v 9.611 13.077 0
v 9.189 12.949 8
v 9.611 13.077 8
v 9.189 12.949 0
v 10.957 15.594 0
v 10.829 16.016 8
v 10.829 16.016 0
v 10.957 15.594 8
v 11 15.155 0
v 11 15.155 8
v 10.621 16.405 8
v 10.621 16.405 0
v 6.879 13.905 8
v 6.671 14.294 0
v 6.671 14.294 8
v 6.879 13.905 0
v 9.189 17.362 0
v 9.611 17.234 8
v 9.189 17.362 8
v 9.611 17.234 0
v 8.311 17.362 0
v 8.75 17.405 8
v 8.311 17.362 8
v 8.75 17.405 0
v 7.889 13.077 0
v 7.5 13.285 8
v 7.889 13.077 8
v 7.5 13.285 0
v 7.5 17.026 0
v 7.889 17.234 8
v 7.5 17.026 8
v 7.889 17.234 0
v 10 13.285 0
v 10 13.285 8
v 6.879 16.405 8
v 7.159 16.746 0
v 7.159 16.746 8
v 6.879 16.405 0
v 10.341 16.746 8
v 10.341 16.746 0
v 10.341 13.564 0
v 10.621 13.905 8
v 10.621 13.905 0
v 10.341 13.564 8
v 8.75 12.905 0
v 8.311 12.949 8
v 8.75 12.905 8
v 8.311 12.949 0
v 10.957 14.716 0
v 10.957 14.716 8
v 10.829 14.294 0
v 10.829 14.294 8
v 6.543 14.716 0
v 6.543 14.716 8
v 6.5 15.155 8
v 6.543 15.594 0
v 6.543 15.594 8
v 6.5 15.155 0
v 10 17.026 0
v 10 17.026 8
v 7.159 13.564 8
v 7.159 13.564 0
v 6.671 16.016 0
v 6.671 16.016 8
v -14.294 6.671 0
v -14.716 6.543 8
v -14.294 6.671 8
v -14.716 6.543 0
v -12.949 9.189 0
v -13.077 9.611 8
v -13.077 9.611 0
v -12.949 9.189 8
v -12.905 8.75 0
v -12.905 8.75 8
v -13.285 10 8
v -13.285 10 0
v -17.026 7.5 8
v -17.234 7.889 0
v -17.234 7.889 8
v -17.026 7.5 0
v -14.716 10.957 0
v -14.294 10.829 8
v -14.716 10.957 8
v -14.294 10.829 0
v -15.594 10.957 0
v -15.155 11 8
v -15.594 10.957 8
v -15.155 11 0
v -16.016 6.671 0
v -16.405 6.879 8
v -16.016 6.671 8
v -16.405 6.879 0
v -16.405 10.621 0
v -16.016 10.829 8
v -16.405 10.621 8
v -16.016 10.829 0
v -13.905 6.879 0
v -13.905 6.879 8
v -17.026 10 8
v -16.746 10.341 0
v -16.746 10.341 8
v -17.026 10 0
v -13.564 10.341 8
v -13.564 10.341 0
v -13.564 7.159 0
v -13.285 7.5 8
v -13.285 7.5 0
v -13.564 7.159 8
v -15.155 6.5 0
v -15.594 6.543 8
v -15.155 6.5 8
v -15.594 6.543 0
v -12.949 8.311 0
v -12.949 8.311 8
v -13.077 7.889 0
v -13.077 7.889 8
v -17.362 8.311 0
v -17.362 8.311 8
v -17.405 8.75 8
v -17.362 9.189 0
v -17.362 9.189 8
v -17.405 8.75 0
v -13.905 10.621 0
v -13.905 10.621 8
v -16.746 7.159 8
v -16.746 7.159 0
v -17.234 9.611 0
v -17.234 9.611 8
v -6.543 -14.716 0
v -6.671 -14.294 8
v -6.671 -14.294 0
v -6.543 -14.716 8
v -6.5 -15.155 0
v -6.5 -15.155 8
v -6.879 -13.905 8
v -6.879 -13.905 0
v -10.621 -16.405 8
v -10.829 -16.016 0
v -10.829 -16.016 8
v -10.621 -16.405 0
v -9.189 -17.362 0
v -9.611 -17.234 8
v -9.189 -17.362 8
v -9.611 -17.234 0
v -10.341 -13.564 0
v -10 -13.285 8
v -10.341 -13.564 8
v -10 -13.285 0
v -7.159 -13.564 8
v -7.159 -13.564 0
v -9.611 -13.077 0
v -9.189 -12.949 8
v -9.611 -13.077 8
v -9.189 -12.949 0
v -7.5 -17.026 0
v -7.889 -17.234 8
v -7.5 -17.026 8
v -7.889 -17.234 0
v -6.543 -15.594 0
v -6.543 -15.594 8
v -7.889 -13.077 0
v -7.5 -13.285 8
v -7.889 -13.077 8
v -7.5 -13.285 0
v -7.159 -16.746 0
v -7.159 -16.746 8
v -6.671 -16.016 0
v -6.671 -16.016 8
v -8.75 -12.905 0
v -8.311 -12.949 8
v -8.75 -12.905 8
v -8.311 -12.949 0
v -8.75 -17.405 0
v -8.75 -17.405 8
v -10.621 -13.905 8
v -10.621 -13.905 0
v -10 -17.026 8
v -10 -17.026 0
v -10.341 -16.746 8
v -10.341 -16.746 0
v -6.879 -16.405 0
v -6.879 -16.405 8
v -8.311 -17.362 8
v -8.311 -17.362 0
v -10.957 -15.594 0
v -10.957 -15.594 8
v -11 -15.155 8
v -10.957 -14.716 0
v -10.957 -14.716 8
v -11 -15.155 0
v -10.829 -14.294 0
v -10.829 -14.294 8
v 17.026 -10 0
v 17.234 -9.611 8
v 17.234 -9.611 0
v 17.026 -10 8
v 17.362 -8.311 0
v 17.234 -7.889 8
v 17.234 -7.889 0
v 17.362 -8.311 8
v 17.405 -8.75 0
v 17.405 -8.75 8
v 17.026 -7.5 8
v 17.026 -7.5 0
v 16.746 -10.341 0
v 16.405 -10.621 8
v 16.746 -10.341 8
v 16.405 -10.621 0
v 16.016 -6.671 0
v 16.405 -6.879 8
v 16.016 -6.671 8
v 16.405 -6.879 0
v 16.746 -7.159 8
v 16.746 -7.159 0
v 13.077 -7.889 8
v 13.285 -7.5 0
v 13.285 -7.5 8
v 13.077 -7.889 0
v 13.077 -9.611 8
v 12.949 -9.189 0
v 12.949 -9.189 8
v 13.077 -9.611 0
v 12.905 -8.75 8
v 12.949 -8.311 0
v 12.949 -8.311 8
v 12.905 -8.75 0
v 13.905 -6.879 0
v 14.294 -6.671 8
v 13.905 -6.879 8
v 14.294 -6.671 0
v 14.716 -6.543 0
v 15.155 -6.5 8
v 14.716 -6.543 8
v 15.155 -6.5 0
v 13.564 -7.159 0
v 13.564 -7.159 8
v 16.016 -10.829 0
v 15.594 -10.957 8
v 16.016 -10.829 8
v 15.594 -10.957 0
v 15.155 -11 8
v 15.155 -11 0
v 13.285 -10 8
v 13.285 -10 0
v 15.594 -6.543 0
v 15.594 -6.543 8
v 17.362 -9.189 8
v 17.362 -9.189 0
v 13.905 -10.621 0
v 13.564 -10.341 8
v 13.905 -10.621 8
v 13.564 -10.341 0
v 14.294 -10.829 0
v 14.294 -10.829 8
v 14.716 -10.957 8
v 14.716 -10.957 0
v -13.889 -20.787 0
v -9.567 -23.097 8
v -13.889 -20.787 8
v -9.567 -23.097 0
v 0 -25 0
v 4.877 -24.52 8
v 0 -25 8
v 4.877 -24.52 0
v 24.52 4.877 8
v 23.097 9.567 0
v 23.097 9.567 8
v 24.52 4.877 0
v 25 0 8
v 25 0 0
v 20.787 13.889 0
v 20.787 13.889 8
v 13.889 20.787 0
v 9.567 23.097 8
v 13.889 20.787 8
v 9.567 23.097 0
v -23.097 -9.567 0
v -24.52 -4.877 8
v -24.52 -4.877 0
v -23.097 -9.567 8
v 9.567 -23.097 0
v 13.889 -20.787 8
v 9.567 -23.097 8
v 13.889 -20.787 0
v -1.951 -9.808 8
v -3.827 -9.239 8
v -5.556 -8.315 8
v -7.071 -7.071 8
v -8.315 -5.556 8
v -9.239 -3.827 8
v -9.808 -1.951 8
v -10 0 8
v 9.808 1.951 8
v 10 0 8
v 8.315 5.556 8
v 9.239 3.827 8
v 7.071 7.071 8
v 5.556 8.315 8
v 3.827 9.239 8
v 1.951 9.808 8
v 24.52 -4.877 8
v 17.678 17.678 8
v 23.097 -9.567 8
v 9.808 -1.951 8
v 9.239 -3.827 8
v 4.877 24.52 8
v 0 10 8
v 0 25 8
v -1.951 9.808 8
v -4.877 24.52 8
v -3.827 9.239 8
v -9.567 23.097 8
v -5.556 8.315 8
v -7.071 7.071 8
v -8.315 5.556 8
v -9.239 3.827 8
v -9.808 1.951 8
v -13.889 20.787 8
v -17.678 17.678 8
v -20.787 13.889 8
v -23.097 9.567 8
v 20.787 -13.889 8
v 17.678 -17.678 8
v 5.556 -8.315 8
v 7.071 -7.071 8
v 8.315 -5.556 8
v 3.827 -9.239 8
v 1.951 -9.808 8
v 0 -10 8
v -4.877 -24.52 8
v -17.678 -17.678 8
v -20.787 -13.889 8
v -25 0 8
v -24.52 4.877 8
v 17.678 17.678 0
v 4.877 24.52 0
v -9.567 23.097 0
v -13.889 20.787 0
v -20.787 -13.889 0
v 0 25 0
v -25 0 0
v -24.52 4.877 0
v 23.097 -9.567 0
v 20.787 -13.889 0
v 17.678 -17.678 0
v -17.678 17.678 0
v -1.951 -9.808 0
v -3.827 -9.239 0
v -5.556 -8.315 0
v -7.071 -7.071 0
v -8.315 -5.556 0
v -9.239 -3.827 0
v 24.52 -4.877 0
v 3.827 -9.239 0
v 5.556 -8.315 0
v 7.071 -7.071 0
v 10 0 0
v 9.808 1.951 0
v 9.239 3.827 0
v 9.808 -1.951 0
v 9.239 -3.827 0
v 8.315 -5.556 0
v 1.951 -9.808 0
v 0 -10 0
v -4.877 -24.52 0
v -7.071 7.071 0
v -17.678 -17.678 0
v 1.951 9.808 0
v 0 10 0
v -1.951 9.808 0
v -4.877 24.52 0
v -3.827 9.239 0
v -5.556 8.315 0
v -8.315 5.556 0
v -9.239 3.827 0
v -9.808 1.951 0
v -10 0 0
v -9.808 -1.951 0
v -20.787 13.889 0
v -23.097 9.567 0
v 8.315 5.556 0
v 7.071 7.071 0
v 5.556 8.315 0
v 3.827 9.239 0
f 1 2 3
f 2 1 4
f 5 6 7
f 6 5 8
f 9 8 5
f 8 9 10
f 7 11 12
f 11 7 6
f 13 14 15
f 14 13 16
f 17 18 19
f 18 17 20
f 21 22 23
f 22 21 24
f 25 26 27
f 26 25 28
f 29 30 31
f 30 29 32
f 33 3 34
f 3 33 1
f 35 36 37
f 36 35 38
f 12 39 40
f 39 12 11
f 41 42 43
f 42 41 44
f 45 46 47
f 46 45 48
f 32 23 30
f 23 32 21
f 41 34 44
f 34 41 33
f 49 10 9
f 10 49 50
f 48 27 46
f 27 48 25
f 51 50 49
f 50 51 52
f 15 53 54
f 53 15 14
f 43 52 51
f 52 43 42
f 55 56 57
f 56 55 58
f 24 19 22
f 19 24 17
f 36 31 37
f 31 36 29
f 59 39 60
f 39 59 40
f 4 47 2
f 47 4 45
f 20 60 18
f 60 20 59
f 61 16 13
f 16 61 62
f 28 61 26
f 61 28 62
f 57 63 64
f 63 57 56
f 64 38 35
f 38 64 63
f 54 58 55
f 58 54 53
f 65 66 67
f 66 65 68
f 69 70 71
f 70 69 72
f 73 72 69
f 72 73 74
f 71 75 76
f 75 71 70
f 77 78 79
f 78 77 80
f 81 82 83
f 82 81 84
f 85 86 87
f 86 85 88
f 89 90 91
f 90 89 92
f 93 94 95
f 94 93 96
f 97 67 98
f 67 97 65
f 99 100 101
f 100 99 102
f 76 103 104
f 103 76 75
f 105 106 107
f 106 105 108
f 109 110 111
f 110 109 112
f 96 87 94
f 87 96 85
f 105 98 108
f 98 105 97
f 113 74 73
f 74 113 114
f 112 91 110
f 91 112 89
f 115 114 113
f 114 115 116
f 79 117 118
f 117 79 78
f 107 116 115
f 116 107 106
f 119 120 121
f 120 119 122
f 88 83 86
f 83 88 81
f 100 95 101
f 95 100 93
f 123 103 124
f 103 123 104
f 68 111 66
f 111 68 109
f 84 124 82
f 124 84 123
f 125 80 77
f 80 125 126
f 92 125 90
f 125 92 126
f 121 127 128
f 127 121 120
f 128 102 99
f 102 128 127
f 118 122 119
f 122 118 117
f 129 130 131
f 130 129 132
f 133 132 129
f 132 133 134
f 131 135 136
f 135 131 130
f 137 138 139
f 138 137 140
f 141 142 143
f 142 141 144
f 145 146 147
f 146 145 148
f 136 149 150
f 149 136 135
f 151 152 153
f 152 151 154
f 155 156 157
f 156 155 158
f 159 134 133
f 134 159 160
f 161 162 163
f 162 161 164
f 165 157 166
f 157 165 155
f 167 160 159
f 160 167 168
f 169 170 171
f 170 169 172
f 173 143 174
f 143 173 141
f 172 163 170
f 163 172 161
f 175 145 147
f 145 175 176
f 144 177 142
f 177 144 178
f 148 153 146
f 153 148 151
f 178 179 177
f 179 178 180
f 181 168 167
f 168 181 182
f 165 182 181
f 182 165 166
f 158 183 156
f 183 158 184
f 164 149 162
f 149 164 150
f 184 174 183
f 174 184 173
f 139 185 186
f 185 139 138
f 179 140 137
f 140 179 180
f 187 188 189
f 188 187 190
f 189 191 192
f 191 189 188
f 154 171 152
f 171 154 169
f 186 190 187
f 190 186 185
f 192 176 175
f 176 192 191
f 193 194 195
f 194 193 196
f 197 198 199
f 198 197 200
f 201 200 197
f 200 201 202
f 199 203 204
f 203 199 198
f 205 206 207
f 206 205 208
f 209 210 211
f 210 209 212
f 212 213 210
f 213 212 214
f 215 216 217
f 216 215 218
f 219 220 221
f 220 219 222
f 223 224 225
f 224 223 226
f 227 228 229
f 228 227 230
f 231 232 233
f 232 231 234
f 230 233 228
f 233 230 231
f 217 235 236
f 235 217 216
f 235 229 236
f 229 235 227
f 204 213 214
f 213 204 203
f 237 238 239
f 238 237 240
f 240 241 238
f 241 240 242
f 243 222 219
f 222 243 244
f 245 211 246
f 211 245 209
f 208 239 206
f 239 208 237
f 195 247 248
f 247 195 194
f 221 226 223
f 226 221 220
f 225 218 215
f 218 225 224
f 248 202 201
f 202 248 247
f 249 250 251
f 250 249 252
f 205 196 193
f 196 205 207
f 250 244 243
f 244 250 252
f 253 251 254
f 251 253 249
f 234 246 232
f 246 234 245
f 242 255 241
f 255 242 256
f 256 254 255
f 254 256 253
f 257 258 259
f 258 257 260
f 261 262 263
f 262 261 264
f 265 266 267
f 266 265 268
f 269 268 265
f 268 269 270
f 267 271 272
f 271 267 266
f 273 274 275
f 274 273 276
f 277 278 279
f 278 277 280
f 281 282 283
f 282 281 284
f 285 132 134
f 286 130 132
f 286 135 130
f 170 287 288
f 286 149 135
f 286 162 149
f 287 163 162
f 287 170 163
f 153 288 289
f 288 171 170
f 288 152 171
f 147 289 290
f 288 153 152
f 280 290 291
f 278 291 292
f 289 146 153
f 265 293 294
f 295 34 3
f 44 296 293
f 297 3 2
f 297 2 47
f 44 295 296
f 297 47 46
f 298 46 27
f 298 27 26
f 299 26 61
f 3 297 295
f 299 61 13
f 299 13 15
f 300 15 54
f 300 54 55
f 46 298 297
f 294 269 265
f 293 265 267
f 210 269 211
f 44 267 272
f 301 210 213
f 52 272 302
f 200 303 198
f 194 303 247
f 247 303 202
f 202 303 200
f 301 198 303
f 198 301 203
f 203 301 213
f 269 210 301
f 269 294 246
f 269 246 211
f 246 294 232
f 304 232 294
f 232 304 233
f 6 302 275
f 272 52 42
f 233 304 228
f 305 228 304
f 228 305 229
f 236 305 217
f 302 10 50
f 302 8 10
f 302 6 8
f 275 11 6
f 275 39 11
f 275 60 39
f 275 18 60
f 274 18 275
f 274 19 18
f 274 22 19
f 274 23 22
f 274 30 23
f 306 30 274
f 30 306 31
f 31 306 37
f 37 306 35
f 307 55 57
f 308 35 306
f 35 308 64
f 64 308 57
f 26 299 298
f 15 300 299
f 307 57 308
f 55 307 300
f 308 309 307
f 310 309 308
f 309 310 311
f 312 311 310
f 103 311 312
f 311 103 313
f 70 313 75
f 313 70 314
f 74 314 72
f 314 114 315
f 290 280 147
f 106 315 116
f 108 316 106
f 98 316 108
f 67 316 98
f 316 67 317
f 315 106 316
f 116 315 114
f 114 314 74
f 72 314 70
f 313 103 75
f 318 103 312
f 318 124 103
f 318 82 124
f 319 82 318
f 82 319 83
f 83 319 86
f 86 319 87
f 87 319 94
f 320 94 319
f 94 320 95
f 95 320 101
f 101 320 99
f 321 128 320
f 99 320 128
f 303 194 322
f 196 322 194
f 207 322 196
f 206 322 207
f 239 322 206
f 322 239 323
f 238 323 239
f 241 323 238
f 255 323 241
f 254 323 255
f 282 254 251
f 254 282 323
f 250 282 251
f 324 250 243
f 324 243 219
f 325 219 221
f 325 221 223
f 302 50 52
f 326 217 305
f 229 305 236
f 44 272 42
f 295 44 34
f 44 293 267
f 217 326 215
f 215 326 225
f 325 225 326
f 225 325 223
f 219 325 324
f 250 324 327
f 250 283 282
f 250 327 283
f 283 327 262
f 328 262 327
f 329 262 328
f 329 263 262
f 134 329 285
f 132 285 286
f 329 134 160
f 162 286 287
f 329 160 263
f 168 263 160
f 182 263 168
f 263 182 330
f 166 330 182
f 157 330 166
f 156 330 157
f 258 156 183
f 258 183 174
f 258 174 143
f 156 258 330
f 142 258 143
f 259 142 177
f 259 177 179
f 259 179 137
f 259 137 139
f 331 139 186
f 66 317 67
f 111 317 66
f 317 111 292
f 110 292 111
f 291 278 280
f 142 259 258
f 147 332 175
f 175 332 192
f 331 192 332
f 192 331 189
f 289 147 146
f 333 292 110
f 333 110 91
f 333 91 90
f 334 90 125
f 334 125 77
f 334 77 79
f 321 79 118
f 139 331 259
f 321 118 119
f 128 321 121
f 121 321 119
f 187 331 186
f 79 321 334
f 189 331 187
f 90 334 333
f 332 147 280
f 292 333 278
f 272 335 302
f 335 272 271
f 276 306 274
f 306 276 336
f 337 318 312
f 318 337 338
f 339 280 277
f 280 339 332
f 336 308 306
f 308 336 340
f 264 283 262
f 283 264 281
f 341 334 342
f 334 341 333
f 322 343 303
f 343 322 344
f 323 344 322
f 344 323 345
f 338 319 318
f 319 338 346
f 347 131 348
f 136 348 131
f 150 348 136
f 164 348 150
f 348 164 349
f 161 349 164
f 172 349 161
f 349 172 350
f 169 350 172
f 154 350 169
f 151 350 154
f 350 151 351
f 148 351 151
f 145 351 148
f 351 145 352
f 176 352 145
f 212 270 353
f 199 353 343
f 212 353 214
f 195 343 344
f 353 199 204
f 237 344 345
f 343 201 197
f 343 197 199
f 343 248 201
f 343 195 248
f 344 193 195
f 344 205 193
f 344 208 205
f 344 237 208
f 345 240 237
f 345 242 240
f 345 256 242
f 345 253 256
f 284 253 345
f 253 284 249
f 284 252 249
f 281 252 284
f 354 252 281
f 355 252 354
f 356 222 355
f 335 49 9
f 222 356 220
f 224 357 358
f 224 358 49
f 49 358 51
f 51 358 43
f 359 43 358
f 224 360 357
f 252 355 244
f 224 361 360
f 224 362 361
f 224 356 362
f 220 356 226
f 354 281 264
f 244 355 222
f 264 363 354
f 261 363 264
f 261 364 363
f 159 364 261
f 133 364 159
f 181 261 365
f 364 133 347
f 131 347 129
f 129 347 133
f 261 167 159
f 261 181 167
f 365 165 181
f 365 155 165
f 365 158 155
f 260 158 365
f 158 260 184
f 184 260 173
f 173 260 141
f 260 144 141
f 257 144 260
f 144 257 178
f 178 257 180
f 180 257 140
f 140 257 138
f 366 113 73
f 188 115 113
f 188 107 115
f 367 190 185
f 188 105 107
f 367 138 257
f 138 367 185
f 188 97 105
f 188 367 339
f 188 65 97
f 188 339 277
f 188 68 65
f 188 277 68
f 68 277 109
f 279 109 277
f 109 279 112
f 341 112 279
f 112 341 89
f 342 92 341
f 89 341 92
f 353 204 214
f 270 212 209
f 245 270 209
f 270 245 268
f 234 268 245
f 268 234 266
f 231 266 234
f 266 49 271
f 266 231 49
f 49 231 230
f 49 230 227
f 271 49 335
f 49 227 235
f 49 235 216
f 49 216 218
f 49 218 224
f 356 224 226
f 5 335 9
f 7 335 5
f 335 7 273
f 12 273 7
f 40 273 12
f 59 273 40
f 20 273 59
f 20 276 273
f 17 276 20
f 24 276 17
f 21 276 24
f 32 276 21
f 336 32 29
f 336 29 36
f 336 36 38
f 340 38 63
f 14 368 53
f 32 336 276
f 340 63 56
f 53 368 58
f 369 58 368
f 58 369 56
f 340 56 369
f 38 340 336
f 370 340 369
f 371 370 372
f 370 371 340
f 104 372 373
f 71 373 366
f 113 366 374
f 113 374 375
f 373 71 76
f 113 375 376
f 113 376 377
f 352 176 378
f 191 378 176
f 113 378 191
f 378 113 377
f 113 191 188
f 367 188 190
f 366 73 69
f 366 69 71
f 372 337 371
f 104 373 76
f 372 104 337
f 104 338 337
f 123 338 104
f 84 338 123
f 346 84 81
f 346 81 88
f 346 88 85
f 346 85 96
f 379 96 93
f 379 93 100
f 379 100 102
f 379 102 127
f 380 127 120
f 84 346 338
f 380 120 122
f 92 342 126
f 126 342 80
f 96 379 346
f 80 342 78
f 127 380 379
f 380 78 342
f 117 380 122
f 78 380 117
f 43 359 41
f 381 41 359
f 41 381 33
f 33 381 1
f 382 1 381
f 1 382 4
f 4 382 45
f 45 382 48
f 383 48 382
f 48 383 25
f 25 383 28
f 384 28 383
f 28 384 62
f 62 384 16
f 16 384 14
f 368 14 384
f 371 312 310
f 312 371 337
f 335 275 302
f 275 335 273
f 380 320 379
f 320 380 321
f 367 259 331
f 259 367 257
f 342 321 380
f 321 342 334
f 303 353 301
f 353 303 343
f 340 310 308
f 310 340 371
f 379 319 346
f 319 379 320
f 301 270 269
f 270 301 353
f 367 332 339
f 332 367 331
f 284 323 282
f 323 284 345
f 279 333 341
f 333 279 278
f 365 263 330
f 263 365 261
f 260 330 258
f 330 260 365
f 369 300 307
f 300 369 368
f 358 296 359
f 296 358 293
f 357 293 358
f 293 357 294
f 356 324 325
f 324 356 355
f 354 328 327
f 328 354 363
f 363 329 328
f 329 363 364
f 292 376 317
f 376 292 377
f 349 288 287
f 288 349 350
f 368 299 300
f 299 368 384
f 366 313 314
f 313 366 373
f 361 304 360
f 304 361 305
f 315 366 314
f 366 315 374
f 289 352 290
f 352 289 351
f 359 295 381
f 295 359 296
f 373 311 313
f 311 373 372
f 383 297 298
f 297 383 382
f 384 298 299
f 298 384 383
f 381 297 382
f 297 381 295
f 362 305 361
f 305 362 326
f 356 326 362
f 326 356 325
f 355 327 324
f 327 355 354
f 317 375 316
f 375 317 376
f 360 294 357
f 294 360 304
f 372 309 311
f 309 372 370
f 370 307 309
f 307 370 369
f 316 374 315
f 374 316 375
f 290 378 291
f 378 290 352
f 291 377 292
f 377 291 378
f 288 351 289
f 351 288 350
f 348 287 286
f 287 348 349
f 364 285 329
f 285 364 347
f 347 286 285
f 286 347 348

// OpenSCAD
$fn = 32;

// ----------------------------------------------------------------------
// Flange Ø50 x 8
// 4 holes on a Ø35 bolt circle, bolted joints
// ----------------------------------------------------------------------

// --- parameters (mm) ---
flange_d = 50;   // outside diameter of the flange
thickness = 8;   // flange thickness
holes = 4;       // number of bolt holes
pcd = 35;        // bolt circle diameter
start_deg = 60;  // angle of the first hole, from +X
hole_d = 4.5;    // bolt hole diameter
bore_d = 20;     // central through bore
hub_d = 30;      // hub outside diameter
hub_h = 0;       // hub height above the flange face (0 = no hub)

// --- derived feature positions (mm) ---
height = thickness + hub_h;  // = 8   overall height of the part
pcd_r = pcd / 2;             // = 17.5   bolt circle radius
hole_step = 360 / holes;     // = 90   angular pitch
feature_centers = [
  [pcd_r * cos(start_deg + 0 * hole_step), pcd_r * sin(start_deg + 0 * hole_step)],
  [pcd_r * cos(start_deg + 1 * hole_step), pcd_r * sin(start_deg + 1 * hole_step)],
  [pcd_r * cos(start_deg + 2 * hole_step), pcd_r * sin(start_deg + 2 * hole_step)],
  [pcd_r * cos(start_deg + 3 * hole_step), pcd_r * sin(start_deg + 3 * hole_step)]
];   // bolt hole centres on the pitch circle

// flange disc, every hole and the bore cut straight through
difference() {
  union() {
    cylinder(d = flange_d, h = thickness);
  }
  translate([0, 0, -1]) cylinder(d = bore_d, h = height + 2);  // bore, through
  for (centre = feature_centers)
    translate([centre[0], centre[1], -1]) cylinder(d = hole_d, h = thickness + 2);
}
